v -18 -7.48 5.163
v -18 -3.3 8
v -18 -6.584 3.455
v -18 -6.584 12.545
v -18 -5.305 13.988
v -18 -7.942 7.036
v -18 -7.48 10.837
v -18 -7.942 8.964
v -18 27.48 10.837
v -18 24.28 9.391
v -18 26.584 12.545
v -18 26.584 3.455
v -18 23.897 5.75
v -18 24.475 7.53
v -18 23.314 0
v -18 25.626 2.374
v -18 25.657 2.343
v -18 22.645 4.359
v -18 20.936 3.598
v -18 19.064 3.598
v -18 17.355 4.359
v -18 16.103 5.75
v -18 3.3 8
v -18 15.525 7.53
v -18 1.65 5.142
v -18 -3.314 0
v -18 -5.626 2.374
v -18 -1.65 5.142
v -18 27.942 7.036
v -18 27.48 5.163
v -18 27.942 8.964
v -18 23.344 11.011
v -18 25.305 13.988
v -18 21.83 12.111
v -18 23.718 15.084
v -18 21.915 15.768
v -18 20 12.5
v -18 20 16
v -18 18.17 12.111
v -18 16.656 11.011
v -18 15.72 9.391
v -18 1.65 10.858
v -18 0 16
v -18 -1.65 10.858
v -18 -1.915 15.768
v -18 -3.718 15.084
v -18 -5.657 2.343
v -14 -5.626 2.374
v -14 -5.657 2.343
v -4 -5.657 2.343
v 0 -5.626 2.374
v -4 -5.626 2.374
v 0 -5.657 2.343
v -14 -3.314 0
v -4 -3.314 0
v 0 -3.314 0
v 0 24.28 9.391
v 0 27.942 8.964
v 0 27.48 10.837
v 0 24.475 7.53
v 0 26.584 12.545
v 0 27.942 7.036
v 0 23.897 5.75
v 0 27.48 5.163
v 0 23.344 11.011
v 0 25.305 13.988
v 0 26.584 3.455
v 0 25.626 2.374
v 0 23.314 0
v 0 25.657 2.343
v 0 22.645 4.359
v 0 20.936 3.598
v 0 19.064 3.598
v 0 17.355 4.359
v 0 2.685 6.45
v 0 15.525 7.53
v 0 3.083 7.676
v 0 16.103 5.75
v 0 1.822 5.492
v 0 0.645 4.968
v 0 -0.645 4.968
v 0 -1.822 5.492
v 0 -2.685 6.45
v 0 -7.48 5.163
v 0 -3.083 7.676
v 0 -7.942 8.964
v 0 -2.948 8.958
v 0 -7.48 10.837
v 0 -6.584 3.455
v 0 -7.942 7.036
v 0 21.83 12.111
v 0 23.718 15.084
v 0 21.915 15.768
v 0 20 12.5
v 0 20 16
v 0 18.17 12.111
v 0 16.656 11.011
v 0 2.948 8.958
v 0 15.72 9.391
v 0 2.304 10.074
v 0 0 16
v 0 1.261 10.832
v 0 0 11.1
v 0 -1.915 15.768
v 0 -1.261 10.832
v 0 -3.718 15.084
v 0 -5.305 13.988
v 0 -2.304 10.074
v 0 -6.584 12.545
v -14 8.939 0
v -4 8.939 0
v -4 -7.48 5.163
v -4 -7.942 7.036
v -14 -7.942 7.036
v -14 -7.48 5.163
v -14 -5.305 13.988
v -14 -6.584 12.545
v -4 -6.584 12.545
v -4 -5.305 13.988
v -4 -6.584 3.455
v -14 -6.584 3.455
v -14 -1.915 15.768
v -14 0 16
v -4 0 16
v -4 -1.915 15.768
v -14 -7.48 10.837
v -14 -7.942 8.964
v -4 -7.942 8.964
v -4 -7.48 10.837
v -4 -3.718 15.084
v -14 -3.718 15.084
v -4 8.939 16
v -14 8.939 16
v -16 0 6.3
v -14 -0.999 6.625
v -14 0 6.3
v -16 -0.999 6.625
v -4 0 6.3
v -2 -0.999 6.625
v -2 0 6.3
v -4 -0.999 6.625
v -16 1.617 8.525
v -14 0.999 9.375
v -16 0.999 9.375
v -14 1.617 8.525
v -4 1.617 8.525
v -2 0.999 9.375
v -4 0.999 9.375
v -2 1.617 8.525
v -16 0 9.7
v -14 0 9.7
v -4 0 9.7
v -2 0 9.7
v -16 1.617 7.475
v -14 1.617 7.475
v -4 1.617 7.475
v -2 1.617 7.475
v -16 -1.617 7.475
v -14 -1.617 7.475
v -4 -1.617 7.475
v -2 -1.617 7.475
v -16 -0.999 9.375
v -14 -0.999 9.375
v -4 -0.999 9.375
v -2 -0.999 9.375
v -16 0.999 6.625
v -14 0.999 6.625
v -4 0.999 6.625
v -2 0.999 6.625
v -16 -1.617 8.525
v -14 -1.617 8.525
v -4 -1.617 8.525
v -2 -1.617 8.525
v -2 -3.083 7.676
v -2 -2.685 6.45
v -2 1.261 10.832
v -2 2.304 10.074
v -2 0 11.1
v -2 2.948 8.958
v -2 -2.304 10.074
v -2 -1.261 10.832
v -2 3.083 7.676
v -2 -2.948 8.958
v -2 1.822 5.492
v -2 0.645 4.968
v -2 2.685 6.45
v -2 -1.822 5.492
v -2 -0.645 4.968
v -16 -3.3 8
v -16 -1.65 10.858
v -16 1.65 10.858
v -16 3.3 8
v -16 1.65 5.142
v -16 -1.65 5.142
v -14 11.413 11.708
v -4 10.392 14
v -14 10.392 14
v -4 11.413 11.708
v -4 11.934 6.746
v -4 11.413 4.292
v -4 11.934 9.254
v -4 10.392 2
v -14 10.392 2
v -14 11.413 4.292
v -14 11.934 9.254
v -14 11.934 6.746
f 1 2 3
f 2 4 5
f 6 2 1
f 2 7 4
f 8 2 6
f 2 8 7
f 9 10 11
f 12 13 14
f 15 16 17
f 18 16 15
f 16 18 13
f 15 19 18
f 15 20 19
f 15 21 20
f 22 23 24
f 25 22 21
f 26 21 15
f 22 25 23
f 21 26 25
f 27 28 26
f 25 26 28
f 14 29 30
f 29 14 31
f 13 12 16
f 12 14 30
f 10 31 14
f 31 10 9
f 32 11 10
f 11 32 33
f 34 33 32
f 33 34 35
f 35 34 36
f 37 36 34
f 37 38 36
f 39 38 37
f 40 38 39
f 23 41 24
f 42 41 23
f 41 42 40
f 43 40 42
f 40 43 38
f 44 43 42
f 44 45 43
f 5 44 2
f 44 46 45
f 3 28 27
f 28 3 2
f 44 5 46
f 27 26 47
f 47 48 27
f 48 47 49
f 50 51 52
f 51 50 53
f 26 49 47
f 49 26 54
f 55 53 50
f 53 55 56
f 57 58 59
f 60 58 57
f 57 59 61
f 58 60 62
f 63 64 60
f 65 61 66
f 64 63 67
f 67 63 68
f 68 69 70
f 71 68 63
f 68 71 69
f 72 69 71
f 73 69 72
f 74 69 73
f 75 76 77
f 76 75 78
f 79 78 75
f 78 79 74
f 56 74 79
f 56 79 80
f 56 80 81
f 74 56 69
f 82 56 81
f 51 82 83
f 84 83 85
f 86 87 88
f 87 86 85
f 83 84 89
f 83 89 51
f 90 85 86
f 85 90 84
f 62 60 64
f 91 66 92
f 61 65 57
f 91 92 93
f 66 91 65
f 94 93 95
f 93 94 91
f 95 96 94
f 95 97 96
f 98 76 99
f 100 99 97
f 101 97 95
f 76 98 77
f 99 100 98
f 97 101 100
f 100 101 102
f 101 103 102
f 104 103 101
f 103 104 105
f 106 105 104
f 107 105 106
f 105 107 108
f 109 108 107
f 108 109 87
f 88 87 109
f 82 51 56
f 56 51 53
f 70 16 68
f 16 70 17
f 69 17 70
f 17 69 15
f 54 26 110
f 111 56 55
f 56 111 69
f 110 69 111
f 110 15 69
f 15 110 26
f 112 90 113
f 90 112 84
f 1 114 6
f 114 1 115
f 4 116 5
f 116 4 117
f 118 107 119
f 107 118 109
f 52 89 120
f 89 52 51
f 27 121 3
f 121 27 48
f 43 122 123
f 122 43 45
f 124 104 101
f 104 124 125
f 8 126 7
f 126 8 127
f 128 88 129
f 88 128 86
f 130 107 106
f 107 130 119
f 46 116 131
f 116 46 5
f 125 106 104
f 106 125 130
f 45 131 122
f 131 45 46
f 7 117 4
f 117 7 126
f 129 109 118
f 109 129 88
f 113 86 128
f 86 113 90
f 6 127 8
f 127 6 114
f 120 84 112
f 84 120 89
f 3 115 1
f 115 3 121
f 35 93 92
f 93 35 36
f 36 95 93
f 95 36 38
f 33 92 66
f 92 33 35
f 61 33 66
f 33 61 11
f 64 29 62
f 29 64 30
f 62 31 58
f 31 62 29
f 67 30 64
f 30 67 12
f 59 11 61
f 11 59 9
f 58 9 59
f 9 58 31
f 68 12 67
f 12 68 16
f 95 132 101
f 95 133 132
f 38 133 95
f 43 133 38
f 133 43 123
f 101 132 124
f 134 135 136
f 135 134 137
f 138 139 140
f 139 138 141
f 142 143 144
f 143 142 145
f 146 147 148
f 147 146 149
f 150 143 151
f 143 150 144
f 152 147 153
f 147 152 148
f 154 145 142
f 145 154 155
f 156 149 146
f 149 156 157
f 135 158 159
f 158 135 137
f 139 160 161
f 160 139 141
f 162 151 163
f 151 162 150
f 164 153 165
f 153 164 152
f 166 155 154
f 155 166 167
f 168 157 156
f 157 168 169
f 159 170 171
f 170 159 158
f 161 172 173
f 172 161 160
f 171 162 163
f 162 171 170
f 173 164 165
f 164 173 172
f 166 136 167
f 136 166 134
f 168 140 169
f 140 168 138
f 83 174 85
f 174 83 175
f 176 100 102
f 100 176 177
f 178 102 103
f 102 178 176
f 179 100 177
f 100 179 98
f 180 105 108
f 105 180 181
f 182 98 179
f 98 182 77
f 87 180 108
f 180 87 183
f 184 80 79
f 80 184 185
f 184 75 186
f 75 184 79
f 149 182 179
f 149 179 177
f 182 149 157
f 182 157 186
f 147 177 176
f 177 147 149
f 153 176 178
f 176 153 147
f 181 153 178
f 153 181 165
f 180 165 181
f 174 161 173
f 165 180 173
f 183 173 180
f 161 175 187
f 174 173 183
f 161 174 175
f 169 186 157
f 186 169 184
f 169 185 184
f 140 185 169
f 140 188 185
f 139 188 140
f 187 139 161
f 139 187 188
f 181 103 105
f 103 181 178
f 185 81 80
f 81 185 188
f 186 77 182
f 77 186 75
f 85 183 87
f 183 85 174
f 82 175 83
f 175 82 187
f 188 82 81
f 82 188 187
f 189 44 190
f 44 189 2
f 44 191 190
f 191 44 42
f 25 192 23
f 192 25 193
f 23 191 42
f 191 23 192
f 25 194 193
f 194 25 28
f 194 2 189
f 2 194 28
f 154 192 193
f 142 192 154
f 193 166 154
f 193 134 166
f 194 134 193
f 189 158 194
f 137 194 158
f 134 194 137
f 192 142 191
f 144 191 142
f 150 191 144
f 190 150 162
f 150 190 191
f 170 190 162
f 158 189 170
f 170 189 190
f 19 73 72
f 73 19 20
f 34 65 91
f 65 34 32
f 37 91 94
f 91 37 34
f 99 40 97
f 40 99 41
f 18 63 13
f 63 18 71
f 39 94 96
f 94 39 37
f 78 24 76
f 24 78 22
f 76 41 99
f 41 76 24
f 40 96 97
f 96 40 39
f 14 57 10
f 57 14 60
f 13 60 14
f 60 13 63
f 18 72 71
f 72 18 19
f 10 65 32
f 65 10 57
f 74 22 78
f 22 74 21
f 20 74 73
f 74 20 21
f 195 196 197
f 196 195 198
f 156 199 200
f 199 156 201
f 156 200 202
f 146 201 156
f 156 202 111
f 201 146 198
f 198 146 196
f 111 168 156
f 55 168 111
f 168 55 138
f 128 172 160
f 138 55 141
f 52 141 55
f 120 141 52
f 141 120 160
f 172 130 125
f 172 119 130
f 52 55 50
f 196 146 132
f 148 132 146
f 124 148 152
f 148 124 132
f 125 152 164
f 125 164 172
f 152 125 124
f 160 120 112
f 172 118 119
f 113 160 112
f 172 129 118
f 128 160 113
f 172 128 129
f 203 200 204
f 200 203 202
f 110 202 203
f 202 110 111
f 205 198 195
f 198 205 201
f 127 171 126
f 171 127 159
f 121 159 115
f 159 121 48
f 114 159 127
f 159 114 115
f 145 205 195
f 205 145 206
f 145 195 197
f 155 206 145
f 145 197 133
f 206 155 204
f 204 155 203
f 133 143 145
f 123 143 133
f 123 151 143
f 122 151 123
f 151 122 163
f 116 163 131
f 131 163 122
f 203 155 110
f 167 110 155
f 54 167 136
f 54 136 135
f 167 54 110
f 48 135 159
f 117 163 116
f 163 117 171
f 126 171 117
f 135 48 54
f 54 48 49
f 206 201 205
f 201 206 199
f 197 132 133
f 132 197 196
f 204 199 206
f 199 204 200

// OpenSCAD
// PRUSA iteration3
// Y idler
// GNU GPL v3
// Josef Průša <iam@josefprusa.cz> and contributors
// http://www.reprap.org/wiki/Prusa_Mendel
// http://prusamendel.org


module y_idler_base() {
  translate(v = [0,0,0]) cylinder(h = 18, r = 8);
  translate(v = [0,20,0]) cylinder(h = 18, r = 8);
  translate(v = [0,10,9]) cube(size = [16, 20, 18], center = true);
  intersection() {
    translate(v = [-4,10,9]) cube(size = [8, 16+20, 18], center = true);
    union() {
      rotate(a = [0,0,135]) cube(size = [8,8,18]);
      translate(v = [0,20,0]) rotate(a = [0,0,135]) cube(size = [8,8,18]);
    }
  }
}

module y_idler_holes() {
  translate(v = [0,0,-1]) cylinder(h = 120, r = 1.7, $fn = 10);
  translate(v = [0,0,-1]) cylinder(h = 3, r = 3.1, $fn = 15);
  translate(v = [0,0,16]) rotate([0,0,30]) cylinder(h = 3, r = 3.3, $fn = 6);
  translate(v = [0,20,-1]) cylinder(h = 25, r = 4.5);
  translate(v = [0,0,4]) cylinder(h = 10, r = 12);
}


// Final part
module y_idler() {
  translate(v = [0,0,8])rotate([0,-90,0]) difference() {
    y_idler_base();
    y_idler_holes();
  }
}

y_idler();
